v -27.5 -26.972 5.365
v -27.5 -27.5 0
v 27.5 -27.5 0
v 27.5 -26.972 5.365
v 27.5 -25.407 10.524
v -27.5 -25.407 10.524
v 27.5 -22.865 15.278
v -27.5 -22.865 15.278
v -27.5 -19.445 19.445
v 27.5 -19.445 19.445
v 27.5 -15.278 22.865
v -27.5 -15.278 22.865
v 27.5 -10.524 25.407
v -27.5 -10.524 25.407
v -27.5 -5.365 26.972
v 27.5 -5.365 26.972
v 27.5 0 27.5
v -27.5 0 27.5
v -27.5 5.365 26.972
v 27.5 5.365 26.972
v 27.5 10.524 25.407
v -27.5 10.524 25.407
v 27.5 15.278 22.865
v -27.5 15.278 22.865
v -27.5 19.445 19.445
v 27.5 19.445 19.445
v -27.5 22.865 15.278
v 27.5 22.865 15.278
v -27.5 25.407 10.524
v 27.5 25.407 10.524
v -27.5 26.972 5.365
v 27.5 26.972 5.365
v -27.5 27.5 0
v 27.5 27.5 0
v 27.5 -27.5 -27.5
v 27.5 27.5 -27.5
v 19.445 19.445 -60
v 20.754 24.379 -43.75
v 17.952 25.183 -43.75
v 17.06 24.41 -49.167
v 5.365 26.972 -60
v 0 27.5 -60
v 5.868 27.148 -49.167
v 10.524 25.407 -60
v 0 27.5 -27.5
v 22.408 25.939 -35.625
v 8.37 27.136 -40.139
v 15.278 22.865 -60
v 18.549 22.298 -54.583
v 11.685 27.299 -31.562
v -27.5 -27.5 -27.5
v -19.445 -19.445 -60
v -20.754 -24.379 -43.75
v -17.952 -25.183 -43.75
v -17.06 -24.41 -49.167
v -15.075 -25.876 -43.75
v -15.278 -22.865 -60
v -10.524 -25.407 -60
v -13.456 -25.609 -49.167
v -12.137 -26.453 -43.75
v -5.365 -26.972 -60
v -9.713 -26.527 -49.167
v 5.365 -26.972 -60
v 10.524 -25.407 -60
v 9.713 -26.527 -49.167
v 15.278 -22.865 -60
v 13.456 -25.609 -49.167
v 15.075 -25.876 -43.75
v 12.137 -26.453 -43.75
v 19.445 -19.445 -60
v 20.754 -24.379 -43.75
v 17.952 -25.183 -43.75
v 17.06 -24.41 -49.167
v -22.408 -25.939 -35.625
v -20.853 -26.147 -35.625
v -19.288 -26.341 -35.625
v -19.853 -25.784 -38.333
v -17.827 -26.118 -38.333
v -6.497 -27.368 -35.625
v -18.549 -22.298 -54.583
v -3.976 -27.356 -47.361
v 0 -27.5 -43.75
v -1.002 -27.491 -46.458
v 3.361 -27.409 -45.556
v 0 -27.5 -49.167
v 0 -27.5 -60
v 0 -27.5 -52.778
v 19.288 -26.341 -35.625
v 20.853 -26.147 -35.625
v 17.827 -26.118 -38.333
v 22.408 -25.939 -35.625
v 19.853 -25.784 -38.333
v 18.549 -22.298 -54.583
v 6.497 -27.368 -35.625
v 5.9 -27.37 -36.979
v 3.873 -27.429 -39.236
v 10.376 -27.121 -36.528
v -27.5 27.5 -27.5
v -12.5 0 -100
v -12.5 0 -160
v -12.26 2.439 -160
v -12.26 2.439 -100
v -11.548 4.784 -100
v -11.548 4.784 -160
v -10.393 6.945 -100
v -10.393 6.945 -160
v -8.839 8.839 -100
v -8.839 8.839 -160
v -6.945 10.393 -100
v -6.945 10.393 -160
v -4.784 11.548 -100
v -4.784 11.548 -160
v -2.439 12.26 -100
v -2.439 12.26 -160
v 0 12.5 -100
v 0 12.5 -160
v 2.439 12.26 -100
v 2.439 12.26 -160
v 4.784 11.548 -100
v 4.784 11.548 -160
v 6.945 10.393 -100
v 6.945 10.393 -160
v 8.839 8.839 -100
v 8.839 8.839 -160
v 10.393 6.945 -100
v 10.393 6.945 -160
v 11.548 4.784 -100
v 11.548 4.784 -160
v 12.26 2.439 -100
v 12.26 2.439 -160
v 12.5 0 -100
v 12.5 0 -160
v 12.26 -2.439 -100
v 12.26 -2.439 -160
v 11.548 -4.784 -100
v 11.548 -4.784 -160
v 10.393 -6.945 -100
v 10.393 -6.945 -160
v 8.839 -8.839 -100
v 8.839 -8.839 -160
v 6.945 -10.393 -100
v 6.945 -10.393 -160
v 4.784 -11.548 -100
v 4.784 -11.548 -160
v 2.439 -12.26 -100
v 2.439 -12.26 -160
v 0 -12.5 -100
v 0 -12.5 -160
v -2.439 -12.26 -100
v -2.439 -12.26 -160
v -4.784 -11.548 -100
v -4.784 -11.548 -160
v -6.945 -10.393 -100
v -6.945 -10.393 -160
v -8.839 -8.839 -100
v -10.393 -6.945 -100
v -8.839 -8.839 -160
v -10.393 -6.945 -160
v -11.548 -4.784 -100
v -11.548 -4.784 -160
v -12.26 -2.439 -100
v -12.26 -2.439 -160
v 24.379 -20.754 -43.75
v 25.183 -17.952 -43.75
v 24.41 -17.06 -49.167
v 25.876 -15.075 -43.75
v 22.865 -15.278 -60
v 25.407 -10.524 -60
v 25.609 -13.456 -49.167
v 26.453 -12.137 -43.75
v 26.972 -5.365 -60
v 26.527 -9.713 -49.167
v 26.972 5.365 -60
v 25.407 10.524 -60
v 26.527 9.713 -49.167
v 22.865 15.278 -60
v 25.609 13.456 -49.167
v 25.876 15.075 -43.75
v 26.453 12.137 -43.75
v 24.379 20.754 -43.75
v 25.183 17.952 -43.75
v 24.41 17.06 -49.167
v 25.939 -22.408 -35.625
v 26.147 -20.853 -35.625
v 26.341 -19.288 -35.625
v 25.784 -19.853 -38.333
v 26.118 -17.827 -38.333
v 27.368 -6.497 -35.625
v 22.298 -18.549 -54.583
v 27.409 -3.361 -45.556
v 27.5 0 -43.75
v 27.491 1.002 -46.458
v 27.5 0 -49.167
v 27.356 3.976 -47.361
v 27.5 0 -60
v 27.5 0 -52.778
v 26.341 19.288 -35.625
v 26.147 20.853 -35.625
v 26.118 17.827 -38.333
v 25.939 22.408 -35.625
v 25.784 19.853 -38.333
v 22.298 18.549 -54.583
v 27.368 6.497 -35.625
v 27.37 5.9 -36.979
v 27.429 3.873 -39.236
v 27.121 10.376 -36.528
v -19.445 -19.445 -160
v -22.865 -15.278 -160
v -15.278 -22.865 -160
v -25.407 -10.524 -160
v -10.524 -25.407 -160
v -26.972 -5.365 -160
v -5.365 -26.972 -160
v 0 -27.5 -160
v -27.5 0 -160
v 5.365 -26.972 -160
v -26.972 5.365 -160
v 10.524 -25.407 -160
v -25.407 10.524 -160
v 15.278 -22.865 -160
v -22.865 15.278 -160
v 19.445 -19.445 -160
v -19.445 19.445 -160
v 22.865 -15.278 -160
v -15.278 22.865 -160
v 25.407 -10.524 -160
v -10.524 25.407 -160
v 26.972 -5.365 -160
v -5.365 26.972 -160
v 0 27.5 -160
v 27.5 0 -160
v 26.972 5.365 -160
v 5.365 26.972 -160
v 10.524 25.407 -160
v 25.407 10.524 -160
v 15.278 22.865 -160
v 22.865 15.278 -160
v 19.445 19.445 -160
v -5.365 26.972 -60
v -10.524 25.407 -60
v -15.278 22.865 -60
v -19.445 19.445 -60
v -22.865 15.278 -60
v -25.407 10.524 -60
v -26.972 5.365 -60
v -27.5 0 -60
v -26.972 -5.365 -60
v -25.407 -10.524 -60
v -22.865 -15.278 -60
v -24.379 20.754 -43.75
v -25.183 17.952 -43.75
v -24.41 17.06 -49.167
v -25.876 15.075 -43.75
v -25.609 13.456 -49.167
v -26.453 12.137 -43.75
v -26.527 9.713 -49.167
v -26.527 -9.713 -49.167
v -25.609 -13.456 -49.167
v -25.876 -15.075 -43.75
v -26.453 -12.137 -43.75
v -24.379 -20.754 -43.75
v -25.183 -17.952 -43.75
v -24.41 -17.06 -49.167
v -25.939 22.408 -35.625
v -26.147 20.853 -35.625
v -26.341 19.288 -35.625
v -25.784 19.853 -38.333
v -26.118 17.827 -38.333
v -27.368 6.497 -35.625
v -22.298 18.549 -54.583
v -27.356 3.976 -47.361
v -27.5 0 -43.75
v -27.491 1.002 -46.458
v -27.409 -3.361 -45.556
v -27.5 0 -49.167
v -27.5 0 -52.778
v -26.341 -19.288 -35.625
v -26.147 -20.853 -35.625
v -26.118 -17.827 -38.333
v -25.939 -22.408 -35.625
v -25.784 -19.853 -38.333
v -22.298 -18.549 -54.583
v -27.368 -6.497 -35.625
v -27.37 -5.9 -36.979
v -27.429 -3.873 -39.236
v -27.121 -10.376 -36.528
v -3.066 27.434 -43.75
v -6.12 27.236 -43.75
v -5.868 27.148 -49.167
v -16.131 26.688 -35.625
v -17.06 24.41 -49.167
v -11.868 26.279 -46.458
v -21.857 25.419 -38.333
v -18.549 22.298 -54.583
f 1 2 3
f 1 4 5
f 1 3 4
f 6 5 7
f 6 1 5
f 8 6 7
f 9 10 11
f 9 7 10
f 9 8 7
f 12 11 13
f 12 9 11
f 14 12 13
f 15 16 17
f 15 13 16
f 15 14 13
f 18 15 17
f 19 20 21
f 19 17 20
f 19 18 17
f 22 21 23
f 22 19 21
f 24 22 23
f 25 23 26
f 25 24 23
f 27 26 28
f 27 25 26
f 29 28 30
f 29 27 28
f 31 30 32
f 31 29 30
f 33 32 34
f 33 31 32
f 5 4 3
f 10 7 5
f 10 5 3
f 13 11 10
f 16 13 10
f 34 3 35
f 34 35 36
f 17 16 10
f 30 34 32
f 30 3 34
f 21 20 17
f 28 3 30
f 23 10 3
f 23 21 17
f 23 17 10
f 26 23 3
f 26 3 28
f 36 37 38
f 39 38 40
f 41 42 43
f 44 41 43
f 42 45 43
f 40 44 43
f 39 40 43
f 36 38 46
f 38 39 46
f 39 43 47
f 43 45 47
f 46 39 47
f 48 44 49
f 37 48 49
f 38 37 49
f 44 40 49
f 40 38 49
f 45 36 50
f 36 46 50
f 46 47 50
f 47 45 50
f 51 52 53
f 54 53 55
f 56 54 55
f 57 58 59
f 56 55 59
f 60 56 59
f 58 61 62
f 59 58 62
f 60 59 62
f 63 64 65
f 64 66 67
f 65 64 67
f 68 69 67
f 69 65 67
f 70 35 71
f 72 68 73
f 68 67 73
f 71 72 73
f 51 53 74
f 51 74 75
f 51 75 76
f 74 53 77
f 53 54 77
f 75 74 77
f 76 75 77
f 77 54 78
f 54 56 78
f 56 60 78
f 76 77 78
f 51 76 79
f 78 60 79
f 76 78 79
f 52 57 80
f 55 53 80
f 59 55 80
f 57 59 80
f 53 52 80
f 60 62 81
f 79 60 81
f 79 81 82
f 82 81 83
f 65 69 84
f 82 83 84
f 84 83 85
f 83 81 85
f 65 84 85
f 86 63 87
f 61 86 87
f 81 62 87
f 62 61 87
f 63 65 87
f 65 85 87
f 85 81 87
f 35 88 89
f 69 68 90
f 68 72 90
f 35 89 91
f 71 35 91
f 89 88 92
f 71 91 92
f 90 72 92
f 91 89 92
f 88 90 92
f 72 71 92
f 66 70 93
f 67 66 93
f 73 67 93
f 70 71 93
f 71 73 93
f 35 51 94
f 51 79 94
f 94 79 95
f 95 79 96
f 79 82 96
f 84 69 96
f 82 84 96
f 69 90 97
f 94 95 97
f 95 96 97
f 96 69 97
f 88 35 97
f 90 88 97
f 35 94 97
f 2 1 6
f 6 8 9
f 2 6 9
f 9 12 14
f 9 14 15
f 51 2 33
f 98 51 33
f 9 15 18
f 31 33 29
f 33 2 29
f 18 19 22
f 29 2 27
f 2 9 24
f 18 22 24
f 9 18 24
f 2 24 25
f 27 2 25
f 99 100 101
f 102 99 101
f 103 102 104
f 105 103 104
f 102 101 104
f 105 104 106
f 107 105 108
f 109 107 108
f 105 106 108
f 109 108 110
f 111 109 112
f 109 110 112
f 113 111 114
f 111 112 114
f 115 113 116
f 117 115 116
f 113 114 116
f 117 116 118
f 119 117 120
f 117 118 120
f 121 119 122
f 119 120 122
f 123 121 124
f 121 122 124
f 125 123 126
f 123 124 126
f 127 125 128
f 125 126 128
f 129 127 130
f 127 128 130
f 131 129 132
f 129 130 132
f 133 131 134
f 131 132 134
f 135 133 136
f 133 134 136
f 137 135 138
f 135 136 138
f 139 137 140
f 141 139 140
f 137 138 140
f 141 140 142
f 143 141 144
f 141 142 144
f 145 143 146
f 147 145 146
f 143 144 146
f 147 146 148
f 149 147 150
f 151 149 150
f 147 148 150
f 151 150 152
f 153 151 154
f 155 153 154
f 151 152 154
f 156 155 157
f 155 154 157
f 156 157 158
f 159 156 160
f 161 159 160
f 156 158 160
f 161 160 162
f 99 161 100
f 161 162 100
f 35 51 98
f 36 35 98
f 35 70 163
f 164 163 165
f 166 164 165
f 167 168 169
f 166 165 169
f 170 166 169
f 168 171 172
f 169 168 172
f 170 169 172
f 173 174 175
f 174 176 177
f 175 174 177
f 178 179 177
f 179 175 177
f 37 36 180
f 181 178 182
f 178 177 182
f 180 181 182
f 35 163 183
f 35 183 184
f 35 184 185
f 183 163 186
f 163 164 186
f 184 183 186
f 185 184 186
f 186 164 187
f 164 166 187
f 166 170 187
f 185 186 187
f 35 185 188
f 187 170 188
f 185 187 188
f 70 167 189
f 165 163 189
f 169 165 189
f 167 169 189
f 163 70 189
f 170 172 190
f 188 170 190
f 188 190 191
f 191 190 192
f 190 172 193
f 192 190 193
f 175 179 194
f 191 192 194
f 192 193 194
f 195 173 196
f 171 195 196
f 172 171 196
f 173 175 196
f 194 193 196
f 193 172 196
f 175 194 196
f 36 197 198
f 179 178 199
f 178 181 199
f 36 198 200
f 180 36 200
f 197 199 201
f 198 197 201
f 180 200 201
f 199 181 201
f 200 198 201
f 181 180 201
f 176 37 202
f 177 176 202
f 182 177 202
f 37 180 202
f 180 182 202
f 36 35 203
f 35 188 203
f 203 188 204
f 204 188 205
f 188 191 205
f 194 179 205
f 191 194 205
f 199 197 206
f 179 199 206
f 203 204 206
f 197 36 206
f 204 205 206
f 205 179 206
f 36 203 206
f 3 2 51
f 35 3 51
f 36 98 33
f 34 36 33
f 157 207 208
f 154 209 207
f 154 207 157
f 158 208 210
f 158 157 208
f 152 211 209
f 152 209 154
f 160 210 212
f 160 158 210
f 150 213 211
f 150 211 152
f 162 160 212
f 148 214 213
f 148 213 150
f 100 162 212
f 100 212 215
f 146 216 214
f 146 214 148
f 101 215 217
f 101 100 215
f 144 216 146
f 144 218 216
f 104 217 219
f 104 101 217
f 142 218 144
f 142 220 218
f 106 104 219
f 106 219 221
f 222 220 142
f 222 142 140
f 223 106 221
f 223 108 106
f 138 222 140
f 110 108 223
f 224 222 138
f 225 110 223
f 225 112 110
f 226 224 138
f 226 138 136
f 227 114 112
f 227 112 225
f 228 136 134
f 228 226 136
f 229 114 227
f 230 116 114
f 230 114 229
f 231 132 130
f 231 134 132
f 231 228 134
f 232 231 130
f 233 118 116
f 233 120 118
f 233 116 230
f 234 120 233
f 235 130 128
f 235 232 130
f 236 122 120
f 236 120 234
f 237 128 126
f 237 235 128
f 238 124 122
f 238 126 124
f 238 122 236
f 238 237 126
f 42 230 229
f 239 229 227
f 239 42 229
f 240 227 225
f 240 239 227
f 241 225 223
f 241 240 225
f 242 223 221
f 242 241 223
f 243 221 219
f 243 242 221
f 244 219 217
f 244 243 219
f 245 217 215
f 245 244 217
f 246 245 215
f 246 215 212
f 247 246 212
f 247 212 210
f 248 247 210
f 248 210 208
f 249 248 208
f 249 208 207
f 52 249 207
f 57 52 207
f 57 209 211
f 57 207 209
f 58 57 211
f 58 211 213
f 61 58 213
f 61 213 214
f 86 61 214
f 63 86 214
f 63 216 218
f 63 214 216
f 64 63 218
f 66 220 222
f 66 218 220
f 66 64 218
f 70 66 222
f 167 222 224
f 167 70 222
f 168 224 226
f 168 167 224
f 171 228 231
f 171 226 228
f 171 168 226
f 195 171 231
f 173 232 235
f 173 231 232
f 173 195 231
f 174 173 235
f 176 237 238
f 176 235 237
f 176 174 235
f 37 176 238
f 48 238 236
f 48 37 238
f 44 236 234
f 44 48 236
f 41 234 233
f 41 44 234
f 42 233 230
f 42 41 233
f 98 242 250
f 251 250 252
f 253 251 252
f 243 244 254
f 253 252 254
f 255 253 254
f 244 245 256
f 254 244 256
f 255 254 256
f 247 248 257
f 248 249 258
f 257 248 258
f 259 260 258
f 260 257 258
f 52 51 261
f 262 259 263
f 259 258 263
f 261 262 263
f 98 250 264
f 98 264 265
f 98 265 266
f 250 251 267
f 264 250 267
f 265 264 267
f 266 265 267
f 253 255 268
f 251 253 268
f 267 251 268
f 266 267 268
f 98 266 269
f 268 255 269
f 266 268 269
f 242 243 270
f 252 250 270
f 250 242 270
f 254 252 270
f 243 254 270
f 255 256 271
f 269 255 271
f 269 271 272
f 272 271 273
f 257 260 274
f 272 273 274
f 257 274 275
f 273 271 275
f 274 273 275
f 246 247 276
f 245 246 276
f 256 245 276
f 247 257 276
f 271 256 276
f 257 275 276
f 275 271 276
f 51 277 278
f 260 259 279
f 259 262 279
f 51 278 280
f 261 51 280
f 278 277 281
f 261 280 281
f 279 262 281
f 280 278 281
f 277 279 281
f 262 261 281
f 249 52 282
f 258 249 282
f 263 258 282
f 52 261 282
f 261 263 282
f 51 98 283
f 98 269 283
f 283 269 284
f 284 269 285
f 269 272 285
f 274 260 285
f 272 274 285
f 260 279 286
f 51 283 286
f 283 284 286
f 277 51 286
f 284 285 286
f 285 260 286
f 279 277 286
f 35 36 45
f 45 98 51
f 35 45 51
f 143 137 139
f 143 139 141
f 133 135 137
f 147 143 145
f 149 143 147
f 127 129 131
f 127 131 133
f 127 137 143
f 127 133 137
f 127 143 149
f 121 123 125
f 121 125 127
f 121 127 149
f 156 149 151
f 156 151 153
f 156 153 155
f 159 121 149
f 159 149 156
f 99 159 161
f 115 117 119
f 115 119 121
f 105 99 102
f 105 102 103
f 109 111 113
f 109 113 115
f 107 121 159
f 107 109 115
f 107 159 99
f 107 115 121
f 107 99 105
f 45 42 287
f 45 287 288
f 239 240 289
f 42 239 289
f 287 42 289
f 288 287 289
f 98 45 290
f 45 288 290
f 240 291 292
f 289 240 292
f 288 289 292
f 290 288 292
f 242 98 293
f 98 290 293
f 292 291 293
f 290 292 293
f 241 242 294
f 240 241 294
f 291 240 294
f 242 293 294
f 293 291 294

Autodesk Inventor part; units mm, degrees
ref_plane "YZ Plane" through (0, 0, 0) normal (1, 0, 0) x (0, 1, 0)
sketch "Sketch6" plane through (0, 0, 0) normal (1, 0, 0) x (0, 1, 0)
  circle A0 centre (0, 0) radius 27.5
  line L0 (-27.5, 0) -> (-27.5, -60)
  line L1 (-27.5, -60) -> (27.5, -60)
  line L2 (27.5, -60) -> (27.5, 0)
  line L3 (0, 0) -> (0, -60) construction
  line L4 (-27.5, -27.5) -> (27.5, -27.5)
  dimension "d38" = 55
  dimension "d39" = 60
extrude "Extrusion8" add sketch "Sketch6" along normal mid plane 55 contours A0 | L2 L4 A0 | A0 L4 L0
ref_plane "Work Plane2" through (0, -27.5, -60) normal (0, 0, -1) x (0, 1, 0)
ref_plane "Work Plane1" through (0, 0, 27.5) normal (0, 0, 1) x (1, 0, 0)
sketch "Sketch3" plane through (0, -27.5, -60) normal (0, 0, -1) x (0, 1, 0)
  circle A0 centre (27.5, 0) radius 27.5
  line L0 (55, -27.5) -> (55, 27.5) projected
loft "Loft1" add profiles "Sketch3" separate body section 1 edges at (0, 27.5, -27.5) (27.5, 0, -27.5) (0, -27.5, -27.5) (-27.5, 0, -27.5)
extrude "Extrusion1" add sketch "Sketch3" along normal blind 100 bodies 2
sketch "Sketch5" plane through (0, 0, -160) normal (0, 0, -1) x (-1, 0, 0)
  circle A0 centre (0, 0) radius 12.5
  point P0 (0, 0)
  dimension "d35" = 25
extrude "Extrusion7" cut sketch "Sketch5" against normal blind 60 bodies 2
properties part number "shank_2"
